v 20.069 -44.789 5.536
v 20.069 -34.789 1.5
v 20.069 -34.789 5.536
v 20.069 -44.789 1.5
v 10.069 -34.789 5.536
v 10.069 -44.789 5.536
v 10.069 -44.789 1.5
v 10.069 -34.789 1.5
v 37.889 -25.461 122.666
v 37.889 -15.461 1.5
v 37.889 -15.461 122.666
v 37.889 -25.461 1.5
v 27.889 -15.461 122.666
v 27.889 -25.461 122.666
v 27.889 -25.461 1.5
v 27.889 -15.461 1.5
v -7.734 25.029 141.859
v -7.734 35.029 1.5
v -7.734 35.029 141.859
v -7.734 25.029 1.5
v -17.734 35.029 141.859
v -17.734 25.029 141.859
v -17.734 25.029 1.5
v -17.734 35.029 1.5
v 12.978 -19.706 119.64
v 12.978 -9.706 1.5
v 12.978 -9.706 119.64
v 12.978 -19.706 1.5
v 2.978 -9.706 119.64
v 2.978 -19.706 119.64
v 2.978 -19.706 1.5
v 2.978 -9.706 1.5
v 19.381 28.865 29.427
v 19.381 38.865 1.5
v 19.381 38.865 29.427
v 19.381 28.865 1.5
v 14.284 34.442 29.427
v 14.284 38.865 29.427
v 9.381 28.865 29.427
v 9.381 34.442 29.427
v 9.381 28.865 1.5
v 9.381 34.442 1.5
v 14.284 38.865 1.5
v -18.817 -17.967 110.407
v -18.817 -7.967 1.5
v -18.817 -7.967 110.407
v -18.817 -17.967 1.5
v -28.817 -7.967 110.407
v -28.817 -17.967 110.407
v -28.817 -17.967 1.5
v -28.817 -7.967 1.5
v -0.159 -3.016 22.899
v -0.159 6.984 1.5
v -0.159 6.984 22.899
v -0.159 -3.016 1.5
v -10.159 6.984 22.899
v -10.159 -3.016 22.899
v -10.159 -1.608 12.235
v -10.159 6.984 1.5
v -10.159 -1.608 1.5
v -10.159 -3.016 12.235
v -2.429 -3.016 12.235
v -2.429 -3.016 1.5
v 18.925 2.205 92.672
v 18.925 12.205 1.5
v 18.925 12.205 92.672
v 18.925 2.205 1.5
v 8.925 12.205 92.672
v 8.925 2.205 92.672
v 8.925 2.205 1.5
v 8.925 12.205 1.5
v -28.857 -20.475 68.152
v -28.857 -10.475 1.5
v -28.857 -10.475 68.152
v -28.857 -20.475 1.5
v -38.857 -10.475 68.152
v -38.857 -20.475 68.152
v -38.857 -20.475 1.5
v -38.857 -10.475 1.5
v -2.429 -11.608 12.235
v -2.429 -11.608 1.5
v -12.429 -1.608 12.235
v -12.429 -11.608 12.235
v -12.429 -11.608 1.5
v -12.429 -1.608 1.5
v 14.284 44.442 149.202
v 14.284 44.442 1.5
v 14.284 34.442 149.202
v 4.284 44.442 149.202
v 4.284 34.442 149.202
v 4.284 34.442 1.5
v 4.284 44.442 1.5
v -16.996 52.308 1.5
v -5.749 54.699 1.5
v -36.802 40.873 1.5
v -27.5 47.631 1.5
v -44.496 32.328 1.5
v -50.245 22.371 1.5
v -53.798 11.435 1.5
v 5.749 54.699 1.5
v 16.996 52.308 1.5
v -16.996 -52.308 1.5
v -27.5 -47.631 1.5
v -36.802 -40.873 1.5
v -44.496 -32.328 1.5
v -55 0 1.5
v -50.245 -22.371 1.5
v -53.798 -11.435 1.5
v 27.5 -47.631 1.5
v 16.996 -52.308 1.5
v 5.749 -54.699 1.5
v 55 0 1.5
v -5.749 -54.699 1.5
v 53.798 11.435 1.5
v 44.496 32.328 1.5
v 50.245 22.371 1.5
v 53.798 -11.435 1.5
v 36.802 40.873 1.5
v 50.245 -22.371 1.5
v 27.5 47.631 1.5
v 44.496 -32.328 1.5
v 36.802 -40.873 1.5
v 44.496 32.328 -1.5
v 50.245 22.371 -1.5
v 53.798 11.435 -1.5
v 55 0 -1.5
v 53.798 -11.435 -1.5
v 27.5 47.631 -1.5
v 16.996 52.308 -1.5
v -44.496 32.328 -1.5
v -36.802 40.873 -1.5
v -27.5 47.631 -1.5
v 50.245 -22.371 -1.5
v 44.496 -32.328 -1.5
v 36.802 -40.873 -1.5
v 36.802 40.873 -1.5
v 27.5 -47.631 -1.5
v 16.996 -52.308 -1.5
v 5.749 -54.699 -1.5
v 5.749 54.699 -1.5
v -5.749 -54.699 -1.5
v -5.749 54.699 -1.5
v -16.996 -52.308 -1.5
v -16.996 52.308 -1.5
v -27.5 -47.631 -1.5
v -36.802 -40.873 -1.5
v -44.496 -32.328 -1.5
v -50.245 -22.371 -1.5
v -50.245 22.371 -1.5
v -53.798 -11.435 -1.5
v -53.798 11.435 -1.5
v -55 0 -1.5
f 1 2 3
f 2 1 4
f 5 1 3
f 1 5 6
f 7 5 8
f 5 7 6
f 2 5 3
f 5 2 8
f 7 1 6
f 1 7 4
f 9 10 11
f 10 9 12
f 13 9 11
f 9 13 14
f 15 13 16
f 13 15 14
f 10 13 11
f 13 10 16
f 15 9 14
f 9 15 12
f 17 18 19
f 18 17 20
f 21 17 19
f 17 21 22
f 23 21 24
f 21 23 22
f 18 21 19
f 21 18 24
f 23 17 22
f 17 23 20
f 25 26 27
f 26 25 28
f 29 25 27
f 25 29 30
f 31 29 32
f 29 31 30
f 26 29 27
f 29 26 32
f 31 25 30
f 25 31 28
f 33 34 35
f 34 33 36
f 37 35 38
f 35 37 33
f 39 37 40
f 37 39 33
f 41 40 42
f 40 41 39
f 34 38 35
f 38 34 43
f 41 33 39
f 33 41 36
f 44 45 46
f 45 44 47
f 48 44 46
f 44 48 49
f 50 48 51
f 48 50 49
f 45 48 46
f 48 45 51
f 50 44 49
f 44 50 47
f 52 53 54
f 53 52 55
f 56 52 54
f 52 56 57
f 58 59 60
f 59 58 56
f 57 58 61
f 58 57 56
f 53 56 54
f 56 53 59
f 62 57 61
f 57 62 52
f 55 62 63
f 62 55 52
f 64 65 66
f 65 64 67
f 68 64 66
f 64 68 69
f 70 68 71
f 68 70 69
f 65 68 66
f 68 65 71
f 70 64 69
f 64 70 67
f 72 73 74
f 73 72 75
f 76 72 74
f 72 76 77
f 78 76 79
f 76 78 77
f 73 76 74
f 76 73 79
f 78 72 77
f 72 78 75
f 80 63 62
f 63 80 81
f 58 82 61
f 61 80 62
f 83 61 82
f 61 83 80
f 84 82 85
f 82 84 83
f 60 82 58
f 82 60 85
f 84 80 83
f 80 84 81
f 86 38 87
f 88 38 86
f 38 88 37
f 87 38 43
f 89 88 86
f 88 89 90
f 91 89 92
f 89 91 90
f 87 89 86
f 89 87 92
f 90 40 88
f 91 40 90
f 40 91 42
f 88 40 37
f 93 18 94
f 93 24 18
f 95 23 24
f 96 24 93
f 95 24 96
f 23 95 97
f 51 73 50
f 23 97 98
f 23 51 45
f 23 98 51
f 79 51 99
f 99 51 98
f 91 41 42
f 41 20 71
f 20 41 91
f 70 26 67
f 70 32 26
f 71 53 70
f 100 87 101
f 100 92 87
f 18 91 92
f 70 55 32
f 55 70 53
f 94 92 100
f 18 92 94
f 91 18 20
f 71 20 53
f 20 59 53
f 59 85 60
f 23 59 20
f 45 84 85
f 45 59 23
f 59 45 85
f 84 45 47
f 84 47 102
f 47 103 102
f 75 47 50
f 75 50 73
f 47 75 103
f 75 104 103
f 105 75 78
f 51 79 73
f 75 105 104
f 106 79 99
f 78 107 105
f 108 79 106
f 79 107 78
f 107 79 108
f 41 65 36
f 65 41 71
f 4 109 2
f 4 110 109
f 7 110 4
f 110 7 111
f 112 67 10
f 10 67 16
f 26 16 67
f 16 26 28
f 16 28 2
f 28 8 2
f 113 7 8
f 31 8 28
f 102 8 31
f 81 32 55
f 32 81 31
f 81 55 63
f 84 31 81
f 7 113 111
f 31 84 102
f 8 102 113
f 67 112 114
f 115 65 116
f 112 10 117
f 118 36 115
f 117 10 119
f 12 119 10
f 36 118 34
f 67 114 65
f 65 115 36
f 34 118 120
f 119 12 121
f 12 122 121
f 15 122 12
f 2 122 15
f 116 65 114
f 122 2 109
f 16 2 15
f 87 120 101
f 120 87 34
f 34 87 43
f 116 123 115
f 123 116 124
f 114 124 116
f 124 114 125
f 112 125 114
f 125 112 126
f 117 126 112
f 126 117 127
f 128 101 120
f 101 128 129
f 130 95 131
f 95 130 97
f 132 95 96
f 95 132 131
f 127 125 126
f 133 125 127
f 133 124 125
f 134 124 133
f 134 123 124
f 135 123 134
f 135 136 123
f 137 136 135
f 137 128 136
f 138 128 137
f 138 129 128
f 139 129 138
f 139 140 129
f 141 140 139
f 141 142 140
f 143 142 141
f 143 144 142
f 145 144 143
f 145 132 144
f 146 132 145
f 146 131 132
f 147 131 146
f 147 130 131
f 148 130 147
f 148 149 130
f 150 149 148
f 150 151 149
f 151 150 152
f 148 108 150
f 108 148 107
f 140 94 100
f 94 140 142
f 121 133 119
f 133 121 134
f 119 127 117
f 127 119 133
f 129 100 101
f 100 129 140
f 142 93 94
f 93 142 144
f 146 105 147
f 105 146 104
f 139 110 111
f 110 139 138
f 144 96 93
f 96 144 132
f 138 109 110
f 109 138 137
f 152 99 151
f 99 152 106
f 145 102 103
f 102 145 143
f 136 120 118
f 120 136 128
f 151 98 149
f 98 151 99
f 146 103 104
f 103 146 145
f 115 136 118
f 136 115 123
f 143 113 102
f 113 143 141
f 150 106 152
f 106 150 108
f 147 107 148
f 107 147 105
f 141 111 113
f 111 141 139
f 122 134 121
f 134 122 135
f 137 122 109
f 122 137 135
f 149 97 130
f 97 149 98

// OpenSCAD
radius = 55;
number_of_tower = 10;
tower_size = 10;
max_tower_height = 150;
disk_height = 3;

cylinder(disk_height,   radius, radius,true);
for(i=[0:number_of_tower]) {
    
    height = rands(0,max_tower_height,1)[0];
    tx = rands(tower_size-radius,radius-tower_size,1)[0];
    maxy = sqrt(pow(radius-tower_size, 2) - pow(tx, 2));
    ty = rands(-maxy,maxy,1)[0];
    
    translate([tx,ty,height/2]) cube([tower_size,tower_size,height], true);
}
